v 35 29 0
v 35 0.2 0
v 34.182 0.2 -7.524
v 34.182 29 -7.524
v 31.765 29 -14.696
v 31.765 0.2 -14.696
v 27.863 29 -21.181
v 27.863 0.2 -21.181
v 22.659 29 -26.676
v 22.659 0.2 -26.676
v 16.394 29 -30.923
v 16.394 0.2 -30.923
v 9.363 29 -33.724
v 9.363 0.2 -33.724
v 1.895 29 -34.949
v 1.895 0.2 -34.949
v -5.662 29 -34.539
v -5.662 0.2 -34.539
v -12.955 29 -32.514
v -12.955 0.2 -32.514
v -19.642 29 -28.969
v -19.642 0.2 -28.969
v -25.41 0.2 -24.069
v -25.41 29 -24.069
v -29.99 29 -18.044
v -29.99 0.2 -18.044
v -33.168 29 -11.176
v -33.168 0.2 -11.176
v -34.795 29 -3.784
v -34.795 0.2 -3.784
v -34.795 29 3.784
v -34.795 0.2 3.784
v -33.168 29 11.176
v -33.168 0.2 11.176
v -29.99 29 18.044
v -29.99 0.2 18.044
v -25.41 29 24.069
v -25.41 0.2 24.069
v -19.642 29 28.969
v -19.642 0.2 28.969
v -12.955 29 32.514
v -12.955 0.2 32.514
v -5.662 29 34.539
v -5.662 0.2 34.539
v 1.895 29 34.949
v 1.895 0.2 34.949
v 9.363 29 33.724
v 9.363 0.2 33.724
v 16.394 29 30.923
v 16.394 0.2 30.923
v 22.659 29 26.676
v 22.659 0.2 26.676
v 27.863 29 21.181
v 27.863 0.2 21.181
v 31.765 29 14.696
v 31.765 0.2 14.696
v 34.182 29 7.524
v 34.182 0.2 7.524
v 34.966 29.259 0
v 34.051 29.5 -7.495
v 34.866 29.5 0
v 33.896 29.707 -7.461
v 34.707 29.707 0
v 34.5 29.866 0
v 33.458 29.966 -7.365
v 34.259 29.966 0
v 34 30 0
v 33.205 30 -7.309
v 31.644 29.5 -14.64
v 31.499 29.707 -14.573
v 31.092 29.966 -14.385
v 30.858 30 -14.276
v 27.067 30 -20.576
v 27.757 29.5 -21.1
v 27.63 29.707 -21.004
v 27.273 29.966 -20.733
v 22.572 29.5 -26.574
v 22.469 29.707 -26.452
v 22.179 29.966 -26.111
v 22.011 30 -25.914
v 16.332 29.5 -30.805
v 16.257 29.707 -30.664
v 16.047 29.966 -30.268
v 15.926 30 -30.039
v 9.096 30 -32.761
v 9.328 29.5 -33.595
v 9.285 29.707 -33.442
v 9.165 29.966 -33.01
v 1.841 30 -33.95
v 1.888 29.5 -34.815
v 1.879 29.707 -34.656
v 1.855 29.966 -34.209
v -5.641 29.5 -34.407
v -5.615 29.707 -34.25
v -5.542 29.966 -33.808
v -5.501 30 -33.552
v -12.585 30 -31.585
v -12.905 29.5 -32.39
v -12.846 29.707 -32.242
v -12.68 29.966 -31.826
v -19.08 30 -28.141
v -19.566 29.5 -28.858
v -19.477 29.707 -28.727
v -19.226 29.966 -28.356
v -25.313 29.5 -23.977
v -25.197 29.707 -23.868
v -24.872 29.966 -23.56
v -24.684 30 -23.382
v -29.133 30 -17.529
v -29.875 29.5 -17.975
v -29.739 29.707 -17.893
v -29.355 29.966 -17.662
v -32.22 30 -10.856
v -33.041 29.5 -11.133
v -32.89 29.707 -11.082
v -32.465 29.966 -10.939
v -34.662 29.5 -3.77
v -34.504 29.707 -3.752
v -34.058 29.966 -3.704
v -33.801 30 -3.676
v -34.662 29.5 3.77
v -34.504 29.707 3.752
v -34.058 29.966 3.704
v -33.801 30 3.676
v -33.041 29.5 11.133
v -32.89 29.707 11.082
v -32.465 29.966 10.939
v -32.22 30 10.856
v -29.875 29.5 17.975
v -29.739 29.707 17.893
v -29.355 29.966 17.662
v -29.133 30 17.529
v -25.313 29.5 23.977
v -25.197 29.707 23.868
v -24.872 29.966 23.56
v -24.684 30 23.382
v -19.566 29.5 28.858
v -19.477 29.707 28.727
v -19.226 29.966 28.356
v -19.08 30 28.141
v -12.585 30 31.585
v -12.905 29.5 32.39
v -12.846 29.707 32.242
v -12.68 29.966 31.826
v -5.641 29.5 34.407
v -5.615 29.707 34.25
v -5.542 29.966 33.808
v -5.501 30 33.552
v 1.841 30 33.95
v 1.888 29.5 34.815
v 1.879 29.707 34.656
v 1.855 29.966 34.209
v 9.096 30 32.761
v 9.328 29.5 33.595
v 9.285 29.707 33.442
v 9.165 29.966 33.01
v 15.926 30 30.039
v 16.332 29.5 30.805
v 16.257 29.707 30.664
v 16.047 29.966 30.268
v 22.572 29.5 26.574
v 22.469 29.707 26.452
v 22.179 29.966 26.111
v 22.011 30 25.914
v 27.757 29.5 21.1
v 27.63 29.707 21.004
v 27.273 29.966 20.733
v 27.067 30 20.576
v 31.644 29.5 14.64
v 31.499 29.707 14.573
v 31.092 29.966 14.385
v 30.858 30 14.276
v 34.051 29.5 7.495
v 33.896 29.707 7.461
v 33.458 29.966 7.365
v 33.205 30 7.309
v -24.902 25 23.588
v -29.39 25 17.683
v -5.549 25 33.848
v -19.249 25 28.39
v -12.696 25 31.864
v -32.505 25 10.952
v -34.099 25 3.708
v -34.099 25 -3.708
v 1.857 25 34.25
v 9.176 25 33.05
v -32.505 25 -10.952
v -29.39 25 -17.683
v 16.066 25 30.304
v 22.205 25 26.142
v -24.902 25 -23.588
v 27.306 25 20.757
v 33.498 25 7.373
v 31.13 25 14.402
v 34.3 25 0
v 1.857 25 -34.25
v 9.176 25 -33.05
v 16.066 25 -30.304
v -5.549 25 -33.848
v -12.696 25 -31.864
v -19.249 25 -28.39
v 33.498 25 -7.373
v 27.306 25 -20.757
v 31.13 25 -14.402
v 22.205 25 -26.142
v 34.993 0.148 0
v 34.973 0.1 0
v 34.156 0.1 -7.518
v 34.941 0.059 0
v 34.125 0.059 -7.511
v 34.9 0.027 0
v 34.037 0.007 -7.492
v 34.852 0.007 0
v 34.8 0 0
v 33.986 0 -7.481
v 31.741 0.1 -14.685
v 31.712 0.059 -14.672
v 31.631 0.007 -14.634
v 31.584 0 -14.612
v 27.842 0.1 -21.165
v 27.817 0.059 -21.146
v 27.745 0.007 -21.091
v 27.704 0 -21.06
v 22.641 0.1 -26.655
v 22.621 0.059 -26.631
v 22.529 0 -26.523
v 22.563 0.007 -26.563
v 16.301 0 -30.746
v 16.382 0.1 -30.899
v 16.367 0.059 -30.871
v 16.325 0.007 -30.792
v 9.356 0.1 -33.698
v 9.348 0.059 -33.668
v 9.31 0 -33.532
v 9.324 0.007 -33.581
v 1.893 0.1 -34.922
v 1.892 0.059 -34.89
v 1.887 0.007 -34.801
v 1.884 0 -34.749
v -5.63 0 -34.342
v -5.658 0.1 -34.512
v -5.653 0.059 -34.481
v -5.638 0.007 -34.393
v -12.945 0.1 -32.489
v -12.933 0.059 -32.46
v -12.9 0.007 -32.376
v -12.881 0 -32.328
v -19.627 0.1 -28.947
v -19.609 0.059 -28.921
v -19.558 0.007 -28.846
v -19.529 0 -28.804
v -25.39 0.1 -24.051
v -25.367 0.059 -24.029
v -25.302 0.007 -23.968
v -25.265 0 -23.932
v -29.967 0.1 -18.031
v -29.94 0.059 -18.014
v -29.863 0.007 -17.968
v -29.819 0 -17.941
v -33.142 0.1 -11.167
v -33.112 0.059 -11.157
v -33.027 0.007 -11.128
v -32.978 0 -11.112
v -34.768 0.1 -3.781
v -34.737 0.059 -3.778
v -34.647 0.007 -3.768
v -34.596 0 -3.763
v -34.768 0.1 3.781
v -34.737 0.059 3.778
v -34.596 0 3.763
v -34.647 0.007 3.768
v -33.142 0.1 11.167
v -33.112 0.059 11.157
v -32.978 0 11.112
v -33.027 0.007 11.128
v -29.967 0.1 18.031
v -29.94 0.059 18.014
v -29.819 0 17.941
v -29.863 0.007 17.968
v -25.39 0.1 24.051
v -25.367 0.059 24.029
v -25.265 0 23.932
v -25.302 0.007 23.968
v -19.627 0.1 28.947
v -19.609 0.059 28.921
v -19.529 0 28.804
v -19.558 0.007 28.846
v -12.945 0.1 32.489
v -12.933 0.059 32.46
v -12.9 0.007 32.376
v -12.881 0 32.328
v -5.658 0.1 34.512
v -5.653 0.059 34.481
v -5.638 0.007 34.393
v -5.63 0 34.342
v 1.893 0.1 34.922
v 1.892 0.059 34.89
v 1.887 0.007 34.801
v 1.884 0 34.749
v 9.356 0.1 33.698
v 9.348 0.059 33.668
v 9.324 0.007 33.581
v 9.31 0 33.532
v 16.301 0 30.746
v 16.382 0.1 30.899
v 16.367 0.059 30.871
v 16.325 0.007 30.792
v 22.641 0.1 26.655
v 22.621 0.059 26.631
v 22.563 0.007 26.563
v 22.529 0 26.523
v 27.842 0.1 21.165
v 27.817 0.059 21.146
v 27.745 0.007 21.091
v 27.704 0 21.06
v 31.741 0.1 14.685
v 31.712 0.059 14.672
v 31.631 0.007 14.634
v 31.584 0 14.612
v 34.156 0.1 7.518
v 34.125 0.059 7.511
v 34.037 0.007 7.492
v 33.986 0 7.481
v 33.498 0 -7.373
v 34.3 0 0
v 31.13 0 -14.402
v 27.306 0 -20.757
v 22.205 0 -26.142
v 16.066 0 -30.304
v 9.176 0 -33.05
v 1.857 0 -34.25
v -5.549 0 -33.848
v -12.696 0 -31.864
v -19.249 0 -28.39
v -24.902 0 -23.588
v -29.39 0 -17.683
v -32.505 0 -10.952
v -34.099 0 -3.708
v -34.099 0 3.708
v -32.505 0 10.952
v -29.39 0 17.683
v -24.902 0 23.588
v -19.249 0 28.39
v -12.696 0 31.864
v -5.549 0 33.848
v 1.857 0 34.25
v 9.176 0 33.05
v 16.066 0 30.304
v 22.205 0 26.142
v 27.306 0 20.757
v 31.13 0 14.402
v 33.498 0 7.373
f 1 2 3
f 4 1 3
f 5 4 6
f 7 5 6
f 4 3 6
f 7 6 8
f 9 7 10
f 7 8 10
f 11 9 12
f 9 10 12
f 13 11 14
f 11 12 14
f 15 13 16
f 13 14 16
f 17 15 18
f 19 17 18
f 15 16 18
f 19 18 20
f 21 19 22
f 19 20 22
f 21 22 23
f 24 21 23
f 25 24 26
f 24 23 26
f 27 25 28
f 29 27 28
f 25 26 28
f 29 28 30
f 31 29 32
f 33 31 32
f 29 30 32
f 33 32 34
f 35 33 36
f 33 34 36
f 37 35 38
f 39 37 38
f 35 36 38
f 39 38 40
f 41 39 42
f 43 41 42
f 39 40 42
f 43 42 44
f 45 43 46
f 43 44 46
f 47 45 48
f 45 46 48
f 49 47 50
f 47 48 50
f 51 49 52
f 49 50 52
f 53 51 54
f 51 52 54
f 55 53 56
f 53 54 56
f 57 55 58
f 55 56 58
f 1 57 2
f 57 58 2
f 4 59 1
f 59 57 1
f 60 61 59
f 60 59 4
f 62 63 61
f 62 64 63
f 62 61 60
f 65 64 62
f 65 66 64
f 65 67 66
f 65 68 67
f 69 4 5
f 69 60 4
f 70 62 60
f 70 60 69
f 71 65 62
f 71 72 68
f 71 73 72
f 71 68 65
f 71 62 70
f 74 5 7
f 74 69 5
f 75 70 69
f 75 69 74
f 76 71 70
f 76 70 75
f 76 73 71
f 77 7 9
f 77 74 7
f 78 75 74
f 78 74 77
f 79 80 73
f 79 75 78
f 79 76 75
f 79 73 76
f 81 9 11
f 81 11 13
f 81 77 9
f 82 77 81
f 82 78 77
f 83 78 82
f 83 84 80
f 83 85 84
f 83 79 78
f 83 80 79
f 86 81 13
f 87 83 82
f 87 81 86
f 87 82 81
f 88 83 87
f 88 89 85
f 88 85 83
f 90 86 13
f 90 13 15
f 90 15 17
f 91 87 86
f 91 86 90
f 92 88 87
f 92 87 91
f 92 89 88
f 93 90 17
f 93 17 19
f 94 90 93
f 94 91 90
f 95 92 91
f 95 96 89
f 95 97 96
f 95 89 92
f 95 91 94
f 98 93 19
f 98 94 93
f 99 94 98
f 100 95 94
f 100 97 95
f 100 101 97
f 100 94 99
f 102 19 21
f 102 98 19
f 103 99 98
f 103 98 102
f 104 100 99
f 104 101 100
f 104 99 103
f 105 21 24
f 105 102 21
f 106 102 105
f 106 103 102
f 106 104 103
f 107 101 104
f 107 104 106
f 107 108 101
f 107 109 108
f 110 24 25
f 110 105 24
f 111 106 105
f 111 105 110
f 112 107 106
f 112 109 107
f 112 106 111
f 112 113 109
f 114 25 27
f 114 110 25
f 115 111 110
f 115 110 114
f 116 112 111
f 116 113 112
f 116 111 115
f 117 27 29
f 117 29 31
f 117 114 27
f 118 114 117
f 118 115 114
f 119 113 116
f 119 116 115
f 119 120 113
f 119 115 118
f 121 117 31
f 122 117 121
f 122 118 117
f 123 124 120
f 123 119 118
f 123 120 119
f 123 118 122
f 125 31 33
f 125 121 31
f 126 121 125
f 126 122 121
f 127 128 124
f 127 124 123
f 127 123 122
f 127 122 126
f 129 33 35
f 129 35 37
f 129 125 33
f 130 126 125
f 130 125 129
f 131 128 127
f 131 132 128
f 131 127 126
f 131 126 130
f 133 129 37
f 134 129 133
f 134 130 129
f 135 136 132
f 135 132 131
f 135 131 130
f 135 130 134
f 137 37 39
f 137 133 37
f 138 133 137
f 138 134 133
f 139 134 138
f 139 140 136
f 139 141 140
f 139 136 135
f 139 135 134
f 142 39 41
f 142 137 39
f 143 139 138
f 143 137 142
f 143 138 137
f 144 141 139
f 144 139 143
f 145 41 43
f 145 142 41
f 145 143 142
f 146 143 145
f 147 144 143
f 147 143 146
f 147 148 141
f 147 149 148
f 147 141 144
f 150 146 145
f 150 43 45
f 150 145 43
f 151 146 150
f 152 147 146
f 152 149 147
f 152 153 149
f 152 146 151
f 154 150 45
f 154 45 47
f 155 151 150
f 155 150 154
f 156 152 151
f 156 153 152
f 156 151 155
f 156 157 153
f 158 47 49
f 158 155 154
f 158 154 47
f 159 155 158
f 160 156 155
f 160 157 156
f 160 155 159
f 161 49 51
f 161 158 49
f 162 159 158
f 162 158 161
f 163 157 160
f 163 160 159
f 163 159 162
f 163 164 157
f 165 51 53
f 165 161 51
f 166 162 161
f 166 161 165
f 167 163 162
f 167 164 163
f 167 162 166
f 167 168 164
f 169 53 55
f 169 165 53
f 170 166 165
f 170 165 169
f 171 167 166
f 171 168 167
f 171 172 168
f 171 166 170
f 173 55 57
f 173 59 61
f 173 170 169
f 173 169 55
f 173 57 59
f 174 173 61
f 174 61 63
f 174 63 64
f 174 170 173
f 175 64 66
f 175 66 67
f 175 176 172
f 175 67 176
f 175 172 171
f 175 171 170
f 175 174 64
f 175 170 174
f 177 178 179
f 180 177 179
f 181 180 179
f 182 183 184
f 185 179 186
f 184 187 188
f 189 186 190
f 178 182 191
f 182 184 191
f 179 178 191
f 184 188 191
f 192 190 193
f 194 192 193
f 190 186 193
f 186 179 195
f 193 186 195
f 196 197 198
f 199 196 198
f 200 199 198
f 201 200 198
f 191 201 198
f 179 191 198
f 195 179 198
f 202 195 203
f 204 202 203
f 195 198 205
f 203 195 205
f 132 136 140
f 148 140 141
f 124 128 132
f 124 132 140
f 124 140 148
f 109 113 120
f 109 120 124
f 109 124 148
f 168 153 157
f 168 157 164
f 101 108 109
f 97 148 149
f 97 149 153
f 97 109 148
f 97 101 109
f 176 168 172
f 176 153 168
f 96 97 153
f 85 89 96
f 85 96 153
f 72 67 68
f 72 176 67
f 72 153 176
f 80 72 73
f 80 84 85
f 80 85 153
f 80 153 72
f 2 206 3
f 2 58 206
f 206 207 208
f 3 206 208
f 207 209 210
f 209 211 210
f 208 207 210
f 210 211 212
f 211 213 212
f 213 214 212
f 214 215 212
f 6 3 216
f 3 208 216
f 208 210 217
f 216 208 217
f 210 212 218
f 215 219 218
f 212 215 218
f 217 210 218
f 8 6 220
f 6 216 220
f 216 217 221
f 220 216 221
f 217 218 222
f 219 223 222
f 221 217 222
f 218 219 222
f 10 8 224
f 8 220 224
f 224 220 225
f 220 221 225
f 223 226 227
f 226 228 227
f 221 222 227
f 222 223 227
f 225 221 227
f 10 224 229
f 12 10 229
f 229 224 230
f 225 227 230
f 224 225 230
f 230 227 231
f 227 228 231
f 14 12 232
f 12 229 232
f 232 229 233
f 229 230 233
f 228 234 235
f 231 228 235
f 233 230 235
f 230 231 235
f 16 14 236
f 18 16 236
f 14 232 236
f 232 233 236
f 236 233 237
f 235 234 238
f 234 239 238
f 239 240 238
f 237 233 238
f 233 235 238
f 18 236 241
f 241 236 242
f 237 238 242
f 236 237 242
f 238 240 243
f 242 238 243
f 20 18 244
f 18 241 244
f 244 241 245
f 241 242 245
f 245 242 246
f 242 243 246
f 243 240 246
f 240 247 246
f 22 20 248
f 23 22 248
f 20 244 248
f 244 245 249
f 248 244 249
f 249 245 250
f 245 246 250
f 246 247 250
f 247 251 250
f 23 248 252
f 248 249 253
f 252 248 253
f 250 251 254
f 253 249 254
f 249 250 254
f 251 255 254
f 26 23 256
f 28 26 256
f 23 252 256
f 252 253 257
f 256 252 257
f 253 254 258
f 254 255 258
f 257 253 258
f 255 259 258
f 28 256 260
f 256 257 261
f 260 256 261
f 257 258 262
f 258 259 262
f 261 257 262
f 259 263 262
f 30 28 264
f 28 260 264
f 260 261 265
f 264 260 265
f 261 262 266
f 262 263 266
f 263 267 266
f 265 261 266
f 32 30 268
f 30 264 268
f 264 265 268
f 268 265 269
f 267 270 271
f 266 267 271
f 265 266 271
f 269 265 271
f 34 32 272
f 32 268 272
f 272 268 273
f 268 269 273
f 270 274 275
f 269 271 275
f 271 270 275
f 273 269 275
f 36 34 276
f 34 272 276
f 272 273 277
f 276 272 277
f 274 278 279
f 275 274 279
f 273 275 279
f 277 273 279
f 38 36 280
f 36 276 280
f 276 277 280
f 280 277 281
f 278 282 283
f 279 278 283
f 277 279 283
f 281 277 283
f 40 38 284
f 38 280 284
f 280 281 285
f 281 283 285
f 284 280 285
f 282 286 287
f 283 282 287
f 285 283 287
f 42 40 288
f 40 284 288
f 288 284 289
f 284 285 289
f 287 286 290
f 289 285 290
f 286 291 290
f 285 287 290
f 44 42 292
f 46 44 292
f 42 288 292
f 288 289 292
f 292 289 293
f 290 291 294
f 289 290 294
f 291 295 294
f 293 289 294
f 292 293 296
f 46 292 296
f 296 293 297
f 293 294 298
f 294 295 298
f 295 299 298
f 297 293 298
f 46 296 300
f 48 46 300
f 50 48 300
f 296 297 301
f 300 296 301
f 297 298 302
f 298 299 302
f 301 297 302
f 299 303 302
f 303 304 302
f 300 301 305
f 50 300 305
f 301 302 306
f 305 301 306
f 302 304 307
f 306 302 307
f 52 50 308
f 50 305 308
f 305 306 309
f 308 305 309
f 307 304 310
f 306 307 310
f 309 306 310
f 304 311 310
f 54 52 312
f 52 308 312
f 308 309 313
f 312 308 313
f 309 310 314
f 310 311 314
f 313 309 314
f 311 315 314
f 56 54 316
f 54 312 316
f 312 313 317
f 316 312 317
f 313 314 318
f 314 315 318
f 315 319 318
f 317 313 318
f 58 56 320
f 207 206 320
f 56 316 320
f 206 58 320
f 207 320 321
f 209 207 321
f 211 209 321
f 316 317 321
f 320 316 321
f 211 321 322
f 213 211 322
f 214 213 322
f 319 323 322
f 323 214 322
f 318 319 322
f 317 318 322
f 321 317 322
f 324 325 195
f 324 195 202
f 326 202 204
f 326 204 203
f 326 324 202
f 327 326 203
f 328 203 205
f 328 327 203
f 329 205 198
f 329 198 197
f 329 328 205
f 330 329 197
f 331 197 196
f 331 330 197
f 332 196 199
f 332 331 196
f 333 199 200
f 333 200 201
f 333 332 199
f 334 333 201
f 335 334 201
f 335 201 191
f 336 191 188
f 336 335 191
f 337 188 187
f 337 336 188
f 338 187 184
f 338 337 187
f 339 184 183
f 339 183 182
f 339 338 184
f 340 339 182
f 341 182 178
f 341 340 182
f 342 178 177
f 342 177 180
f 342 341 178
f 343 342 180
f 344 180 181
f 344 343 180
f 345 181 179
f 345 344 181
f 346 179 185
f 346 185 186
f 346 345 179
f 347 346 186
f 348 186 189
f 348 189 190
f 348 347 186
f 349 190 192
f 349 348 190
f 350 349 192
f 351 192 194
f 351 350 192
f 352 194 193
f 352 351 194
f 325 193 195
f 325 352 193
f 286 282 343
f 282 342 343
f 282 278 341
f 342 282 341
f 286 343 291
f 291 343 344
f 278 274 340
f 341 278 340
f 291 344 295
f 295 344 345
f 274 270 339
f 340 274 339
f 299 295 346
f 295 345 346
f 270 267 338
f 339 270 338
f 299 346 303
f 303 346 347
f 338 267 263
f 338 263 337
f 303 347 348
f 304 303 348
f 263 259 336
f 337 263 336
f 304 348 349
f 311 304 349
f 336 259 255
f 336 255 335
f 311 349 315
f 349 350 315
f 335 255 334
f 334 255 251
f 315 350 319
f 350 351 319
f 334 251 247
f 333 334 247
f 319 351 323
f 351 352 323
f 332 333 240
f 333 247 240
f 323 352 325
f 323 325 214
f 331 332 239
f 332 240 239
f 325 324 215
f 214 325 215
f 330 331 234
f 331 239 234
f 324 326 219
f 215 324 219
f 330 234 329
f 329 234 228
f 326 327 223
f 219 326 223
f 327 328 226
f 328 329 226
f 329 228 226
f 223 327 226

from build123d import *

# Parameters (mm, degrees)
SKETCH1_R           = 35
BOSS_EXTRUDE1_DEPTH = 30
SKETCH2_R           = 34.3
CUT_EXTRUDE1_DEPTH  = 25
FILLET1_R           = 1
FILLET2_R           = 0.2


with BuildPart() as part:
    # Sketch1 → Boss-Extrude1 (new body)
    with BuildSketch(Plane(origin=(0, 0, 0), x_dir=(1, 0, 0), z_dir=(0, 1, 0))):
        Circle(SKETCH1_R)
    extrude(amount=BOSS_EXTRUDE1_DEPTH)

    # Sketch2 → Cut-Extrude1 (cut)
    with BuildSketch(Plane(origin=(0, 0, 0), x_dir=(1, 0, 0), z_dir=(0, 1, 0))):
        Circle(SKETCH2_R)
    extrude(amount=CUT_EXTRUDE1_DEPTH, mode=Mode.SUBTRACT)

    # Fillet1
    fillet1_edges = [part.edges().sort_by_distance(p)[0] for p in [
        (-35, 30, 0),
    ]]
    fillet(fillet1_edges, radius=FILLET1_R)

    # Fillet2
    fillet2_edges = [part.edges().sort_by_distance(p)[0] for p in [
        (-35, 0, 0),
    ]]
    fillet(fillet2_edges, radius=FILLET2_R)


solid = part.part
